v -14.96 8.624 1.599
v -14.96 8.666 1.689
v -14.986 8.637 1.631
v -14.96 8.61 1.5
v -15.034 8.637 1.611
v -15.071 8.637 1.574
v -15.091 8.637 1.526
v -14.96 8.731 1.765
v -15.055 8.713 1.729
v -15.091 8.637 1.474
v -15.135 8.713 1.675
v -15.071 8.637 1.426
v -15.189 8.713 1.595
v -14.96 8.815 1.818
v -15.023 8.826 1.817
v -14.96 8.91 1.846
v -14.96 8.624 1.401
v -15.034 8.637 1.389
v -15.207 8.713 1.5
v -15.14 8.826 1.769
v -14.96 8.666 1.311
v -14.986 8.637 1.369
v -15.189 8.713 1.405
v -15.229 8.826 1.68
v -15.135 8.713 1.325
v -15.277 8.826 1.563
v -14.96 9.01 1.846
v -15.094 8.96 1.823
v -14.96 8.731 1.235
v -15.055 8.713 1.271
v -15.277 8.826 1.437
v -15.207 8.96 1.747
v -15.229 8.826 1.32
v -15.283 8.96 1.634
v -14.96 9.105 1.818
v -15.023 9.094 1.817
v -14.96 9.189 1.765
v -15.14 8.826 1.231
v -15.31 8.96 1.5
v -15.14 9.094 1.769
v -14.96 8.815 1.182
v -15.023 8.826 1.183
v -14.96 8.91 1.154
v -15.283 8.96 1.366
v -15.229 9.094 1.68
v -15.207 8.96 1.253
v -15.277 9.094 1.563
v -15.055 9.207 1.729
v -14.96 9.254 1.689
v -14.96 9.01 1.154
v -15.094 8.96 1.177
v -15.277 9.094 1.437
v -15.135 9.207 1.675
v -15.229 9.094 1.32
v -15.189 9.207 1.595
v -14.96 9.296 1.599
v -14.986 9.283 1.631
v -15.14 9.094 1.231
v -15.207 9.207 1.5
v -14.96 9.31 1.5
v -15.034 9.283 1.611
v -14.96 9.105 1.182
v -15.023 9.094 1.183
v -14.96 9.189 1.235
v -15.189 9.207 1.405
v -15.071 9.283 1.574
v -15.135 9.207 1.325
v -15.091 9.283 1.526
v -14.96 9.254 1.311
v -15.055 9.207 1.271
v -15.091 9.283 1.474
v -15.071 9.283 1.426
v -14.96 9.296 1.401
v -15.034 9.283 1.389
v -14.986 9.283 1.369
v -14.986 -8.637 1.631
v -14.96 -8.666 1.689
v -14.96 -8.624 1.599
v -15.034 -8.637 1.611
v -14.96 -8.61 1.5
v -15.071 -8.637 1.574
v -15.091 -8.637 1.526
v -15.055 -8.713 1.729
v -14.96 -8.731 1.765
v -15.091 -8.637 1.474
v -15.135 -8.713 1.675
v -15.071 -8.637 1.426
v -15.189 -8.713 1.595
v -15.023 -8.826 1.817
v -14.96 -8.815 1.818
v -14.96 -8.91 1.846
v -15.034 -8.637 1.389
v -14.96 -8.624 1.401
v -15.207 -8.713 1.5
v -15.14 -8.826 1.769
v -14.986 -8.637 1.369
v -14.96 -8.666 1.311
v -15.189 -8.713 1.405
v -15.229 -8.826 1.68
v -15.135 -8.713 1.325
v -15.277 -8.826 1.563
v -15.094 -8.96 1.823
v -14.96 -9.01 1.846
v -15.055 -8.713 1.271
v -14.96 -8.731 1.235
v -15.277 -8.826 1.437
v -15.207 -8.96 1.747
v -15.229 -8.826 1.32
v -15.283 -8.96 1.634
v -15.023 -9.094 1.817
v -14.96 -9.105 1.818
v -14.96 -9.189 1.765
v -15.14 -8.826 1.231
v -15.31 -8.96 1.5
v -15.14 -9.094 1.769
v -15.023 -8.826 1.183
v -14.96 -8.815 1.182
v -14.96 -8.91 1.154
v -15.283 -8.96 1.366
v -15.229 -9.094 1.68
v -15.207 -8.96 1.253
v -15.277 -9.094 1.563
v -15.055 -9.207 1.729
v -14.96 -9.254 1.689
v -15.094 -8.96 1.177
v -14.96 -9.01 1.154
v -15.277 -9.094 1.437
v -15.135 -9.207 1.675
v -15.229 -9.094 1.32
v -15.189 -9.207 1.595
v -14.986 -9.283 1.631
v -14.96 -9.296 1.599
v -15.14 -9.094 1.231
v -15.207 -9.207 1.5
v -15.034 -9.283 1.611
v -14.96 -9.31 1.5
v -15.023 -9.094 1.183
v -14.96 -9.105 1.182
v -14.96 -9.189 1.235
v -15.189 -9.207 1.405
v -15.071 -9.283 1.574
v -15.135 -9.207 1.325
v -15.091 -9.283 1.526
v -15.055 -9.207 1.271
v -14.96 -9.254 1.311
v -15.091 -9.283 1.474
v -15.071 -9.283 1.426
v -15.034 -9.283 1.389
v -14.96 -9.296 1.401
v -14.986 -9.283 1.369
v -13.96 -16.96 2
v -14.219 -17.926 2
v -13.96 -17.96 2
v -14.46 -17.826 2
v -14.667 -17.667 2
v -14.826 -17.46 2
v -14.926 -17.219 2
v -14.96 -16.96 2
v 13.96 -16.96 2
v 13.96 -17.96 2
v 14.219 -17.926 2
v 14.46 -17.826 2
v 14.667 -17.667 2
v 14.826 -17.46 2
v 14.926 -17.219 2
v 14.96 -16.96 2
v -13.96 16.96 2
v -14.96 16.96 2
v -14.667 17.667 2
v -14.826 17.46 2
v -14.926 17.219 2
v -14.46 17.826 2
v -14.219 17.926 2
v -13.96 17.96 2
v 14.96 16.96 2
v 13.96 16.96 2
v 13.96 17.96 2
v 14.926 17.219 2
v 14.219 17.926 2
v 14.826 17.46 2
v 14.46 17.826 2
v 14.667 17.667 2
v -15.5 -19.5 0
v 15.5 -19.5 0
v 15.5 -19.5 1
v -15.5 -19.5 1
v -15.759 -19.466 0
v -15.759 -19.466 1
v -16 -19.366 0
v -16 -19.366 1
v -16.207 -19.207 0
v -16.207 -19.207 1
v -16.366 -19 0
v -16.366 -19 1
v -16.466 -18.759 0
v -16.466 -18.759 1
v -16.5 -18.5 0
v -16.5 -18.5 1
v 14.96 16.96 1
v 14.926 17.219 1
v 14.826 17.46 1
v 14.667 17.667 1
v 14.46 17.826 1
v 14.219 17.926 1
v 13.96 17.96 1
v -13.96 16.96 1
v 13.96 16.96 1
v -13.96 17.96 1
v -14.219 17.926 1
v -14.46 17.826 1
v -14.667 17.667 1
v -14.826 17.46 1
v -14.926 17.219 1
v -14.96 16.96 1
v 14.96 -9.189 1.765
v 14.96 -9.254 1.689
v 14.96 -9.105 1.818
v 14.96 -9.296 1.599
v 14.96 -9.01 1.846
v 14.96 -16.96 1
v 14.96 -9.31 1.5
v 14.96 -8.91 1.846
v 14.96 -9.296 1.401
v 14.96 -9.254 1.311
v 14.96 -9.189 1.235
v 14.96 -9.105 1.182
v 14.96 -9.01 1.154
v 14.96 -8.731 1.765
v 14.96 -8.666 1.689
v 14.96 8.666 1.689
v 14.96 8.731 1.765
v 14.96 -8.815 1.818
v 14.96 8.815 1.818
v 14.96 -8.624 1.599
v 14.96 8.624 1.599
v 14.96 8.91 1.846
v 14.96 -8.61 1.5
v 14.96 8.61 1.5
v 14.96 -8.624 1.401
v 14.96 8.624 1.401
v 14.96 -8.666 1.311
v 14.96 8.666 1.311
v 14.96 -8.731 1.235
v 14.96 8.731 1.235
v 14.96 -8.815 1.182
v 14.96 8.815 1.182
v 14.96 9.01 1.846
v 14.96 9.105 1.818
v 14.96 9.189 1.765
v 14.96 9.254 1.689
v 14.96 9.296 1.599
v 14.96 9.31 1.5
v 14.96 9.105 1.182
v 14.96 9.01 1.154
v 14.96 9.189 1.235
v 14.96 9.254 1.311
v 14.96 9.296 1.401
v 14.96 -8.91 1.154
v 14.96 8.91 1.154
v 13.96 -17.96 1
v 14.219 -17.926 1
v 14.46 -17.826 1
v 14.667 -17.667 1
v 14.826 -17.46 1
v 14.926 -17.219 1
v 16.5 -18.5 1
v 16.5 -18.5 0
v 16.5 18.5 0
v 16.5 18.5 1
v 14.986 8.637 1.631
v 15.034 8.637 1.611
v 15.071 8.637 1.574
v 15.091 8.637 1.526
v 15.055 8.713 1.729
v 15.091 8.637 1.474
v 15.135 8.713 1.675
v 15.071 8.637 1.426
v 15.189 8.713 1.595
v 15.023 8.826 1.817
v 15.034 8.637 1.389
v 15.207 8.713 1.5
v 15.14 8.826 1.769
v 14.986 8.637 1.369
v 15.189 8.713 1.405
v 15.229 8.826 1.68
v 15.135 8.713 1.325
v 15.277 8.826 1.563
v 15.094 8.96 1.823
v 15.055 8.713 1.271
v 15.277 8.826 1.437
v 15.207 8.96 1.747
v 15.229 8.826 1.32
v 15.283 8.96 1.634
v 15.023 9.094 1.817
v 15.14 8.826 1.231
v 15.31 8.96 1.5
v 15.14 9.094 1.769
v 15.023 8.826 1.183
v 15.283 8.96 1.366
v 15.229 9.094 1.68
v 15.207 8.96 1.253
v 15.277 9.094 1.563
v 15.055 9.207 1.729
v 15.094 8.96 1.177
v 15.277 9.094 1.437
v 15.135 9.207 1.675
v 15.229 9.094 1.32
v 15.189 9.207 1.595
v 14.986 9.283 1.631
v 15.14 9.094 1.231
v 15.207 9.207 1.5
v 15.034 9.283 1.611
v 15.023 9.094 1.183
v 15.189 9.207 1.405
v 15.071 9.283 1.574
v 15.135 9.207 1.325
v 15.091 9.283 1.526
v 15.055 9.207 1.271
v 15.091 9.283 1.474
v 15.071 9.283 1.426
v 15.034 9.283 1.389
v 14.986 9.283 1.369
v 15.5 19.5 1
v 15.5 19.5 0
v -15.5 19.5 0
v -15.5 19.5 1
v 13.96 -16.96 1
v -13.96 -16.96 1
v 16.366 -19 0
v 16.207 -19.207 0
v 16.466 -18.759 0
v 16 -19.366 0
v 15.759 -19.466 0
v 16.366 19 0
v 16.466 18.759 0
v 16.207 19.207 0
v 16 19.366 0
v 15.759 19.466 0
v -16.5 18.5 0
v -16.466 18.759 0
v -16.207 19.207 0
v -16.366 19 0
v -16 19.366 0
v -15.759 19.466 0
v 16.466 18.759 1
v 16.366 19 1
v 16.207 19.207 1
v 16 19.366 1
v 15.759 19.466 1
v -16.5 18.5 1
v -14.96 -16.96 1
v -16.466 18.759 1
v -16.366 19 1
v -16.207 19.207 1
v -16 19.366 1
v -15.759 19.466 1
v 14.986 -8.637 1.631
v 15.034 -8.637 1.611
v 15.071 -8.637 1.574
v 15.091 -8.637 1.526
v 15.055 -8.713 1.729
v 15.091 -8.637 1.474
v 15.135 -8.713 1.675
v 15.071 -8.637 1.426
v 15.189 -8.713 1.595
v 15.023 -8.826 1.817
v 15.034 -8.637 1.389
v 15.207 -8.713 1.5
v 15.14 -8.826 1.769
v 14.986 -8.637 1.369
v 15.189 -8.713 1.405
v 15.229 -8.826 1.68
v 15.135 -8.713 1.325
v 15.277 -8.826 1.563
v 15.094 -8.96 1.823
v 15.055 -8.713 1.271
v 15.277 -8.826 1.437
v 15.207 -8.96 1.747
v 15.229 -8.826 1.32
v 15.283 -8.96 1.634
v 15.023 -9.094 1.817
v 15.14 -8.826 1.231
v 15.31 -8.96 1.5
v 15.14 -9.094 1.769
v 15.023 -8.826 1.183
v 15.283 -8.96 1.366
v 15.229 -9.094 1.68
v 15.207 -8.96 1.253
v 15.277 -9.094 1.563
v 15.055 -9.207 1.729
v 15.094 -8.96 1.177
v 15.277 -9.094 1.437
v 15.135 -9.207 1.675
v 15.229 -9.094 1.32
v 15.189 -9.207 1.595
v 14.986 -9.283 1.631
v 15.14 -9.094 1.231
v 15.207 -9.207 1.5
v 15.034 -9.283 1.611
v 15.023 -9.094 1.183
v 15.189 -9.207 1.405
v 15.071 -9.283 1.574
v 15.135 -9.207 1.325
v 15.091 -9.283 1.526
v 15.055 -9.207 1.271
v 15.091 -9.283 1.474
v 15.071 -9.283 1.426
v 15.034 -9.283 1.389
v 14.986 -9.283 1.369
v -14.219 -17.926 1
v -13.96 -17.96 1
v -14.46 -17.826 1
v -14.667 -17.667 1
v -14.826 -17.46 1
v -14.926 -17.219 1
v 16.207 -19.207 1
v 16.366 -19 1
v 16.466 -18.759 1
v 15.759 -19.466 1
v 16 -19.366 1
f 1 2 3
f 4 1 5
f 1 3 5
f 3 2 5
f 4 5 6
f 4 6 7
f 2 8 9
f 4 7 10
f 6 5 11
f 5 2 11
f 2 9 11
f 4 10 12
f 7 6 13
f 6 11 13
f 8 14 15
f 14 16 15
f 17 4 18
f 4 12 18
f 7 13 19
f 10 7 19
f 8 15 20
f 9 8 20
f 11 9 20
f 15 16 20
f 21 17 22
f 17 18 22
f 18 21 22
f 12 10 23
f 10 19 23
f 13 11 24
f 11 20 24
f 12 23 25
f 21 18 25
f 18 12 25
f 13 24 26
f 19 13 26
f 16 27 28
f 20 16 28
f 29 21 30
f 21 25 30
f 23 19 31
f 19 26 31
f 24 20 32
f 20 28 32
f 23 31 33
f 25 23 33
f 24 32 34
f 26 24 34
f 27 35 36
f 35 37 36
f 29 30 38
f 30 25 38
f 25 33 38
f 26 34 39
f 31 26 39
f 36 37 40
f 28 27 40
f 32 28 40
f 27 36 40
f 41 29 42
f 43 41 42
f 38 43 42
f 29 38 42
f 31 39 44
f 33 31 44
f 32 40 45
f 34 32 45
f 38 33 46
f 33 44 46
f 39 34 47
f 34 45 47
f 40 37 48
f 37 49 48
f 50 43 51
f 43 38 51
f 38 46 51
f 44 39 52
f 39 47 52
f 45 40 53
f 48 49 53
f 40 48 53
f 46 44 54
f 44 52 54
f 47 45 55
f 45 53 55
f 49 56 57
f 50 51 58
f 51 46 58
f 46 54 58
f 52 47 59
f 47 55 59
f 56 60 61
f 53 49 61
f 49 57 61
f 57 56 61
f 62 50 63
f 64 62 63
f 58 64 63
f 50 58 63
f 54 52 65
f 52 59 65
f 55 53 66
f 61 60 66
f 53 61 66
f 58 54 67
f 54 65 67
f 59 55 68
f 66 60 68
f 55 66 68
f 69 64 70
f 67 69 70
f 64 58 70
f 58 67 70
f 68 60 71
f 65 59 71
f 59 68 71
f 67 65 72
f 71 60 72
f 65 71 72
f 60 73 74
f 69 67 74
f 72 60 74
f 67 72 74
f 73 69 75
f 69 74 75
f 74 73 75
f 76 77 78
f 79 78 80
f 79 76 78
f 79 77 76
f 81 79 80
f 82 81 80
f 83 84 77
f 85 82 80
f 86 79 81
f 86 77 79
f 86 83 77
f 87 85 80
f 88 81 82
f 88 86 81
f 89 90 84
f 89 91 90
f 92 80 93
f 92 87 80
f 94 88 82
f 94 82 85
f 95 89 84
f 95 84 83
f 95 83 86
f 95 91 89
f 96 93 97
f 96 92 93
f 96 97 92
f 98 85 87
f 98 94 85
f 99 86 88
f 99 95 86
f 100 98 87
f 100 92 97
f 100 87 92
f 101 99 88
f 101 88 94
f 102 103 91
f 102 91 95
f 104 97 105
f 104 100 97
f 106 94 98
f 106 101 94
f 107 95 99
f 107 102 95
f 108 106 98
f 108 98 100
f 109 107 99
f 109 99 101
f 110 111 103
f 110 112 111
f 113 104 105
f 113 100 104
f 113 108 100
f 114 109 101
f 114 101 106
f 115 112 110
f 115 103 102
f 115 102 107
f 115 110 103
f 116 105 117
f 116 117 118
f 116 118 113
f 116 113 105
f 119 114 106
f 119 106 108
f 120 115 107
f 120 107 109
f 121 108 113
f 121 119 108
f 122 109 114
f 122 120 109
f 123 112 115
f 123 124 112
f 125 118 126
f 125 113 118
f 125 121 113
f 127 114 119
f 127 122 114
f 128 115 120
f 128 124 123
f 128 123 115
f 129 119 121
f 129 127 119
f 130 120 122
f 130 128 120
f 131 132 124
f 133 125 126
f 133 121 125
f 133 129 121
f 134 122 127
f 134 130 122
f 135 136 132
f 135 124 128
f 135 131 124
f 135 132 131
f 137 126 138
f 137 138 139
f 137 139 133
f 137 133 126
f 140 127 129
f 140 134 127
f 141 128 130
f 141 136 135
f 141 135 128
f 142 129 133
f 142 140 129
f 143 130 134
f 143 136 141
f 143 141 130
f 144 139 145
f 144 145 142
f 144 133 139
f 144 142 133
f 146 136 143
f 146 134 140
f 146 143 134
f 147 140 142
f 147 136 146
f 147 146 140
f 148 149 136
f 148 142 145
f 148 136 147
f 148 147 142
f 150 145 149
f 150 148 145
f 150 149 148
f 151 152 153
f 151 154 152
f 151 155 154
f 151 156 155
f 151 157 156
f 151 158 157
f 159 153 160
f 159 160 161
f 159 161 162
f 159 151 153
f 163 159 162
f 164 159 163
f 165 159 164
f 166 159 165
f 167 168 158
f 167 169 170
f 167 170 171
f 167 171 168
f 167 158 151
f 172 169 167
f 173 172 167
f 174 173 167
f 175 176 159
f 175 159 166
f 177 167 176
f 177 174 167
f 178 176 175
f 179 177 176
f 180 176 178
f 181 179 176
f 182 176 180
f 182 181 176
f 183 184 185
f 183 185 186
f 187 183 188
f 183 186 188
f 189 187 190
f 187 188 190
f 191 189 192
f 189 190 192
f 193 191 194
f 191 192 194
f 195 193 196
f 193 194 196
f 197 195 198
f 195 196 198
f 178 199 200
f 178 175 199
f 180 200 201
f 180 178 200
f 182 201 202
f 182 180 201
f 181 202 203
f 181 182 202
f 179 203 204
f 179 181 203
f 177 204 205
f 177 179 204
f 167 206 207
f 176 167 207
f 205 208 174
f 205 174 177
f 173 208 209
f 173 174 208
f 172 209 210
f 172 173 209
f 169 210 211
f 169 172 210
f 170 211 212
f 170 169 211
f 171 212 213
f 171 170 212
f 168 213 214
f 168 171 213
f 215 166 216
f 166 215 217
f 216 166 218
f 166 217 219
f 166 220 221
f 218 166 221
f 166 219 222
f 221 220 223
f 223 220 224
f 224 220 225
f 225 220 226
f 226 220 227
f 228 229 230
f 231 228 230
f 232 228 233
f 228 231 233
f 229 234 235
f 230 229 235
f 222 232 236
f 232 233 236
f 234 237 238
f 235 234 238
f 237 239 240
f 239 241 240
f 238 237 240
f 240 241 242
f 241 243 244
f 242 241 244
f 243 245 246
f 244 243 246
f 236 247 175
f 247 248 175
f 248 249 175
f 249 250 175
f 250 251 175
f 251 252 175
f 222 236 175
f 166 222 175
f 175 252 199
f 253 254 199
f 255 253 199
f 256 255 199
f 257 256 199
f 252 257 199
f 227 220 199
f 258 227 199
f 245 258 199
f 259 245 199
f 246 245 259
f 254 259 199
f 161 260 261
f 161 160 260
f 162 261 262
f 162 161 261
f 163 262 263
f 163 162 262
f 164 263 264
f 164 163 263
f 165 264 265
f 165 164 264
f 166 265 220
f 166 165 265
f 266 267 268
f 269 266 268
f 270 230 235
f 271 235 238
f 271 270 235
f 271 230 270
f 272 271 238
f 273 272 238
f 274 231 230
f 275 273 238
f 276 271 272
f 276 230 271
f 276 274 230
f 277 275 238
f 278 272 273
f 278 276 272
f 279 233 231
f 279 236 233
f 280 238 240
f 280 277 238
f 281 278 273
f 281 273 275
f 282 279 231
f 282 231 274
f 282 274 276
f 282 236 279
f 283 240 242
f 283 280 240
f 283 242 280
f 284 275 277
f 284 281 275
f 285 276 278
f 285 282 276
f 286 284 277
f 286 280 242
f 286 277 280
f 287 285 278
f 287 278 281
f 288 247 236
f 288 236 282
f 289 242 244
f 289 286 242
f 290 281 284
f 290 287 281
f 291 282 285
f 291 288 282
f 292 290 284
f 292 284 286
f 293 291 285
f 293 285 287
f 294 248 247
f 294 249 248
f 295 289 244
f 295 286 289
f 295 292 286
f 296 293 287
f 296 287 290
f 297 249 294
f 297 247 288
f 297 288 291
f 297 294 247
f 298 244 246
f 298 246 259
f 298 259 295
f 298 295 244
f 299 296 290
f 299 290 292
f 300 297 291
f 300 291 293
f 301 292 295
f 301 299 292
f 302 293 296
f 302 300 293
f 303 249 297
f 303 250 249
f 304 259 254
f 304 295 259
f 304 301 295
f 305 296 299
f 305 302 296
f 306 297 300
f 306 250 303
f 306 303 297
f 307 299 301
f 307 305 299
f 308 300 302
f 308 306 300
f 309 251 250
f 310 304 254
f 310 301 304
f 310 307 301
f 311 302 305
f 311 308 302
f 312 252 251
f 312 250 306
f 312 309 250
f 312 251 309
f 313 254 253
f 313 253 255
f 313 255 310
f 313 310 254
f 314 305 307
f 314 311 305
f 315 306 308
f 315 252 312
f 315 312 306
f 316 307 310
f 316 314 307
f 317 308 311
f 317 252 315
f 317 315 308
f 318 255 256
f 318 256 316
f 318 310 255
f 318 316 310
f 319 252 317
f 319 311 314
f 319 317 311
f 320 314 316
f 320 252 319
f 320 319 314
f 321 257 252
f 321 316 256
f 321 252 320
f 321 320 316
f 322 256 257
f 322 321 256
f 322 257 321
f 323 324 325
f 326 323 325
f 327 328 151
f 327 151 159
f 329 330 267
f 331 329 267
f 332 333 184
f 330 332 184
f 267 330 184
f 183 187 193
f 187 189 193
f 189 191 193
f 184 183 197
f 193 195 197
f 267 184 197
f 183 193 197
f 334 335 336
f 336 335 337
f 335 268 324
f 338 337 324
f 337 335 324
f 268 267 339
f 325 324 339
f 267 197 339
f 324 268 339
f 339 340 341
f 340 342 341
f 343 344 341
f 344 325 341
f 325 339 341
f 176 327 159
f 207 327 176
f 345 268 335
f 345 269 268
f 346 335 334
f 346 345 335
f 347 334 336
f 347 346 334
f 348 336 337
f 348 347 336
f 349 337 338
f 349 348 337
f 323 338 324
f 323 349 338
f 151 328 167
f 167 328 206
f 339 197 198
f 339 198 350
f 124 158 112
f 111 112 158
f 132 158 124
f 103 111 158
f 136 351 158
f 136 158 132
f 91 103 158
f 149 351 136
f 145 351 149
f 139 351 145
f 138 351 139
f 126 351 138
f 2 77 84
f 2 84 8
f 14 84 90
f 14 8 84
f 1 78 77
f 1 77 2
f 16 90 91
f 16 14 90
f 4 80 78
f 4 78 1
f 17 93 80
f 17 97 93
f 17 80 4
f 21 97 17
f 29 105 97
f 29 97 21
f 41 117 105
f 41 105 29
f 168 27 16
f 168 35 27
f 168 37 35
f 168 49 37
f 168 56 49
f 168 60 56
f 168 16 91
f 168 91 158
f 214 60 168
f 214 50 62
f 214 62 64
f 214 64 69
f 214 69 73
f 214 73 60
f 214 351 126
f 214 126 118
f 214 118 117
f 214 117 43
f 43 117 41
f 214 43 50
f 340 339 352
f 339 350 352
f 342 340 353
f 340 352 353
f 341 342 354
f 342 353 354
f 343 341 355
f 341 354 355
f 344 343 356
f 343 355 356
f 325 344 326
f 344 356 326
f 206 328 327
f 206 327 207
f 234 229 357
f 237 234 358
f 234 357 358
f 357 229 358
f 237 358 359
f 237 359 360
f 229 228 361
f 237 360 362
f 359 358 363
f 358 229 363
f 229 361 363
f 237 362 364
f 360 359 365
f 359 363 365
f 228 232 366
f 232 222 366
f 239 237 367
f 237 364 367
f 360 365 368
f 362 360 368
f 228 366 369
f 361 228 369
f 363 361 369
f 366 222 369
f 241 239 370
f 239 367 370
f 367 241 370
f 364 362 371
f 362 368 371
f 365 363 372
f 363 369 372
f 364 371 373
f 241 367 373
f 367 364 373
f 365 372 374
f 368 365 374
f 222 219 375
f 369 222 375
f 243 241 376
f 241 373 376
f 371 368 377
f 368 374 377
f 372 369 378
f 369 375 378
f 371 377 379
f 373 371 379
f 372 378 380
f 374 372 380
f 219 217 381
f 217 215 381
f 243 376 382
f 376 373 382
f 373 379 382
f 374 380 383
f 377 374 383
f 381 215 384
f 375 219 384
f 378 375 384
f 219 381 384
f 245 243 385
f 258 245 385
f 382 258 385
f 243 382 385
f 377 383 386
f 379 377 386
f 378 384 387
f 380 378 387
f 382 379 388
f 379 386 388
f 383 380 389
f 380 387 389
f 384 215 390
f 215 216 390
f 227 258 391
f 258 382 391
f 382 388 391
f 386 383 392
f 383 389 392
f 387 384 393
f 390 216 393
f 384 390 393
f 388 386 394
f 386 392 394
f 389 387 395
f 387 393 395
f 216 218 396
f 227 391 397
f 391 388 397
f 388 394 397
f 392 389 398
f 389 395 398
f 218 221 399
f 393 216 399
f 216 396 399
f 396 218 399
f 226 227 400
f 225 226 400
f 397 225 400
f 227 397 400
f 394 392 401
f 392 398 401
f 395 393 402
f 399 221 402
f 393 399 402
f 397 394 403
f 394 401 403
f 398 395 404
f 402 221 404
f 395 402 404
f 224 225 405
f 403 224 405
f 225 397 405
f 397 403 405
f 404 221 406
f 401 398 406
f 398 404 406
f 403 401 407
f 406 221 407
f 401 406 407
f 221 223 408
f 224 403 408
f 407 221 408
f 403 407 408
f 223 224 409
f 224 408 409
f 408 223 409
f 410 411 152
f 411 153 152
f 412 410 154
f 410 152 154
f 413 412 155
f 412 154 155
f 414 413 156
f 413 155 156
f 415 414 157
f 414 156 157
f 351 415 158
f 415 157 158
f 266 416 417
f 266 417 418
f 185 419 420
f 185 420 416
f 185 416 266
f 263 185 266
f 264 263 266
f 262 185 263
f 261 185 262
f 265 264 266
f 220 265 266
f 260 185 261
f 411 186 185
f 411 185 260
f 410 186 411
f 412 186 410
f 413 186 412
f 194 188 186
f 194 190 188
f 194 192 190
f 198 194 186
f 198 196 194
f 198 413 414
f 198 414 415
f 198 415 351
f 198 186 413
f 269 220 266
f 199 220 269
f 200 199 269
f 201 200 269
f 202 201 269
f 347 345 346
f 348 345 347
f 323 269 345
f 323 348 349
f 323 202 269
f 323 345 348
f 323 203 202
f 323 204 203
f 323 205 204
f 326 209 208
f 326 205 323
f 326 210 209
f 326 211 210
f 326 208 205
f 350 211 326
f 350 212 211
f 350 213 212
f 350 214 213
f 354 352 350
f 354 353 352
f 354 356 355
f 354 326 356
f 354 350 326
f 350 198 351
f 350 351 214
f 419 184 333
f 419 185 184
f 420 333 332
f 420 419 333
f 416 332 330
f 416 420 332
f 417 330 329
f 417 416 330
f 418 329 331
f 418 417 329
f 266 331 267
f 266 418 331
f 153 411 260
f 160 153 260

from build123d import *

# Parameters (mm, degrees)
ESQUISSE1_W            = 39
ESQUISSE1_H            = 33
BOSS_EXTRU_1_DEPTH     = 1
ESQUISSE2_W            = 29.92
ESQUISSE2_H            = 35.92
ESQUISSE2_W_2          = 27.92
ESQUISSE2_H_2          = 33.92
BOSS_EXTRU_2_DEPTH     = 1
R_VOLUTION2_ANGLE      = 180
SYM_TRIE2_COPY_1_ANGLE = 180
CONG_1_R               = 1
CONG_2_R               = 1


with BuildPart() as part:
    # Esquisse1 → Boss.-Extru.1 (new body)
    with BuildSketch(Plane(origin=(0, 0, 0), x_dir=(0, 1, 0), z_dir=(0, 0, 1))):
        Rectangle(ESQUISSE1_W, ESQUISSE1_H)
    extrude(amount=BOSS_EXTRU_1_DEPTH)

    # Esquisse2 → Boss.-Extru.2 (add)
    with BuildSketch(Plane.XY.offset(1)):
        Rectangle(ESQUISSE2_W, ESQUISSE2_H)
        Rectangle(ESQUISSE2_W_2, ESQUISSE2_H_2, mode=Mode.SUBTRACT)
    extrude(amount=BOSS_EXTRU_2_DEPTH)

    # Esquisse3 → Révolution2 (revolve)
    with BuildSketch(Plane.YZ.offset(14.96)):
        with BuildLine():
            Line((-9.31, 1.5), (-8.61, 1.5))
            ThreePointArc((-8.61, 1.5), (-8.96, 1.85), (-9.31, 1.5))
        make_face()
    r_volution2 = revolve(axis=Axis((14.96, -17.96, 1.5), (0, 1, 0)), revolution_arc=R_VOLUTION2_ANGLE)

    # Symétrie1: Révolution2 across plane
    add(r_volution2.mirror(Plane.ZX))

    # Symétrie2: Révolution2 across plane
    add(r_volution2.mirror(Plane(origin=(0, 0, 0), x_dir=(0, 0, 1), z_dir=(1, 0, 0))))

    # Symétrie2 copy 1 sketch → Symétrie2 copy 1 (revolve)
    with BuildSketch(Plane(origin=(-14.96, 0, 0), x_dir=(0, -1, 0), z_dir=(-1, 0, 0))):
        with BuildLine():
            Line((-9.31, 1.5), (-8.61, 1.5))
            ThreePointArc((-8.61, 1.5), (-8.96, 1.85), (-9.31, 1.5))
        make_face()
    revolve(axis=Axis((-14.96, 17.96, 1.5), (0, -1, 0)), revolution_arc=SYM_TRIE2_COPY_1_ANGLE)

    # Congé1
    cong_1_edges = [part.edges().sort_by_distance(p)[0] for p in [
        (16.5, 19.5, 0.5),
        (16.5, -19.5, 0.5),
        (-16.5, -19.5, 0.5),
        (-16.5, 19.5, 0.5),
    ]]
    fillet(cong_1_edges, radius=CONG_1_R)

    # Congé2
    cong_2_edges = [part.edges().sort_by_distance(p)[0] for p in [
        (14.96, 17.96, 1.5),
        (-14.96, 17.96, 1.5),
        (-14.96, -17.96, 1.5),
        (14.96, -17.96, 1.5),
    ]]
    fillet(cong_2_edges, radius=CONG_2_R)


solid = part.part
